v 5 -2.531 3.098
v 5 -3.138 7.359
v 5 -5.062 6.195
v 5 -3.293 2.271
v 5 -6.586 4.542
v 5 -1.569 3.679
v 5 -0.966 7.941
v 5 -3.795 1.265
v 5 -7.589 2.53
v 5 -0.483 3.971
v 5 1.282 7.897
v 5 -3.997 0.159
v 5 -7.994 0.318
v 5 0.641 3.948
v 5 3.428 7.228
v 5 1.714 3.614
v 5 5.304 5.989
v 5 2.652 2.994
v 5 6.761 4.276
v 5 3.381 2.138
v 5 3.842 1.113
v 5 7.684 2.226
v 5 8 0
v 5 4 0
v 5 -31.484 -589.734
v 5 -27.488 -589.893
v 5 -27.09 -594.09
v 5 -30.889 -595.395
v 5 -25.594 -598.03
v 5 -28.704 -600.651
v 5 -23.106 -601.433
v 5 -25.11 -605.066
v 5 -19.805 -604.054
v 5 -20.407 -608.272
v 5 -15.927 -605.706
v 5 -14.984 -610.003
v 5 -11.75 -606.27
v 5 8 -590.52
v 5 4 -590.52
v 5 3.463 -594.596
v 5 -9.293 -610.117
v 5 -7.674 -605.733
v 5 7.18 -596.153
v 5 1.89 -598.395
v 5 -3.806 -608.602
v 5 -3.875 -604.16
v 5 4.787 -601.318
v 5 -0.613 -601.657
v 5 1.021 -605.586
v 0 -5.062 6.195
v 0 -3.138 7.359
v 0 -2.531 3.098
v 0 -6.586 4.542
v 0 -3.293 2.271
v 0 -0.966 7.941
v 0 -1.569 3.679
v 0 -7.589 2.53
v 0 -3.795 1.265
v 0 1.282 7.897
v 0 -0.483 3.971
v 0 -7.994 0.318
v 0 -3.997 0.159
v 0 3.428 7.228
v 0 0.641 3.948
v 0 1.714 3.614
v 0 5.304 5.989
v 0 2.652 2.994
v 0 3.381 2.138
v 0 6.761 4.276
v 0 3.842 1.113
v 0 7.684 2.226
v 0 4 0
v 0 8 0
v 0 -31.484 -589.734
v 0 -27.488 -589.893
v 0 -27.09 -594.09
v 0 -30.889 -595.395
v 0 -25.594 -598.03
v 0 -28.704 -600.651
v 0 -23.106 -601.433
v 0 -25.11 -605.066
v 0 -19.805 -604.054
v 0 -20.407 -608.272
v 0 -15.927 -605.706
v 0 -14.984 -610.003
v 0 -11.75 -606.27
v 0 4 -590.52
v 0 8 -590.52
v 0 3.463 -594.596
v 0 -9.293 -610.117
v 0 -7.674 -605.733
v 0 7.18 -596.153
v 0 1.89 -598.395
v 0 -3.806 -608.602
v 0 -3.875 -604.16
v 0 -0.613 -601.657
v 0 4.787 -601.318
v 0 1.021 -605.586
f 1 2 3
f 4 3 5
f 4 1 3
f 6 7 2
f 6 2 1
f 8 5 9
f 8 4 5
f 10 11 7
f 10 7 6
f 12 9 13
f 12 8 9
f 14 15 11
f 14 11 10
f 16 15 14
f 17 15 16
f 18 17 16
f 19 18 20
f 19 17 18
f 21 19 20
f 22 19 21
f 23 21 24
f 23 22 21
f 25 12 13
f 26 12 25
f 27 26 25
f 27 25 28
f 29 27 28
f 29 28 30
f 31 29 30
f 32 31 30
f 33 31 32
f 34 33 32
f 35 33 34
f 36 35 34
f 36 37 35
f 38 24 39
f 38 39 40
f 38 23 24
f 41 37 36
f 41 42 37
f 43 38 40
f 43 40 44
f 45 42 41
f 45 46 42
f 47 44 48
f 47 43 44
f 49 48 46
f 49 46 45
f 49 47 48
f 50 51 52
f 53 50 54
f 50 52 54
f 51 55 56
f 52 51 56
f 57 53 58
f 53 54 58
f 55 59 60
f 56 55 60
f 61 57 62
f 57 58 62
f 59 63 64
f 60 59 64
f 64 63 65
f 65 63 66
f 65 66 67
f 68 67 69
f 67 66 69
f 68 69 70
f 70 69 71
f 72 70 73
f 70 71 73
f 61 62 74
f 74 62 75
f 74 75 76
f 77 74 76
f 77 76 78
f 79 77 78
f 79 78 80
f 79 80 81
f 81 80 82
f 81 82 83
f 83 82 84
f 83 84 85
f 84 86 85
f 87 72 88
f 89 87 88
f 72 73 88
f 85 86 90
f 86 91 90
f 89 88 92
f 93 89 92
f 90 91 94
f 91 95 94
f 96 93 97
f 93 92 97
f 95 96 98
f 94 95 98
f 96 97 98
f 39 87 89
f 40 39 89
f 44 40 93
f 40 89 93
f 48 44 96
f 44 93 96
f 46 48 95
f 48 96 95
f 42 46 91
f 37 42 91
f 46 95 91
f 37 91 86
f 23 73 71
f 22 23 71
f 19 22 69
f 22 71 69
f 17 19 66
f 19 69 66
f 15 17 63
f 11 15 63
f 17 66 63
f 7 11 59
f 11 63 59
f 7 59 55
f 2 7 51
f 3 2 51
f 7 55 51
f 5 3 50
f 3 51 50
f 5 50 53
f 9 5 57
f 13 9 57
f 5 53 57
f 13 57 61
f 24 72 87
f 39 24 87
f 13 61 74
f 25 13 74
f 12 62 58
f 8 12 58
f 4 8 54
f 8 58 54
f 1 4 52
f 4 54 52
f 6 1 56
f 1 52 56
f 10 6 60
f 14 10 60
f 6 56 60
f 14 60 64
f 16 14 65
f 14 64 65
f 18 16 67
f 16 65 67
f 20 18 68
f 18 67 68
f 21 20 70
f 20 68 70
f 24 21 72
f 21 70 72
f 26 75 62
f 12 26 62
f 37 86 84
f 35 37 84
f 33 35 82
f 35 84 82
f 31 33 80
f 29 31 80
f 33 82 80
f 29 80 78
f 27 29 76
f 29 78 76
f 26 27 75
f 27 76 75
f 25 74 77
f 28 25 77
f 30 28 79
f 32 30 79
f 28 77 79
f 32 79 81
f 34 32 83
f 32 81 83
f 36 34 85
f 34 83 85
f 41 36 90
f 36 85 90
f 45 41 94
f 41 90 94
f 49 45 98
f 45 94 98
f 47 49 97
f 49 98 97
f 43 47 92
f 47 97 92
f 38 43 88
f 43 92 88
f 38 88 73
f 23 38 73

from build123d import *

# Parameters (mm, degrees)
EXTRUDE_1_DEPTH = 5


with BuildPart() as part:
    # ｽｹｯﾁ1 → ﾎﾞｽ - 押し出し1 (new body)
    with BuildSketch(Plane(origin=(0, 0, 0), x_dir=(0, 0, -1), z_dir=(1, 0, 0))):
        with BuildLine():
            Line((590.52, 8), (0, 8))
            ThreePointArc((0, 8), (-7.998416793, 0.159150236), (-0.31823748, -7.993667801))
            Line((-0.31823748, -7.993667801), (589.734351221, -31.484367383))
            ThreePointArc((589.734351221, -31.484367383), (610.266091459, -12.142902145), (590.52, 8))
        make_face()
        with BuildLine():
            ThreePointArc((-0.15911874, -3.9968339), (-3.999208397, 0.079575118), (0, 4))
            Line((0, 4), (590.52, 4))
            ThreePointArc((590.52, 4), (601.656931804, -0.613068196), (606.27, -11.75))
            ThreePointArc((606.27, -11.75), (601.43317213, -23.106283461), (589.893469961, -27.487533482))
            Line((589.893469961, -27.487533482), (-0.15911874, -3.9968339))
        make_face(mode=Mode.SUBTRACT)
    extrude(amount=EXTRUDE_1_DEPTH)


solid = part.part
